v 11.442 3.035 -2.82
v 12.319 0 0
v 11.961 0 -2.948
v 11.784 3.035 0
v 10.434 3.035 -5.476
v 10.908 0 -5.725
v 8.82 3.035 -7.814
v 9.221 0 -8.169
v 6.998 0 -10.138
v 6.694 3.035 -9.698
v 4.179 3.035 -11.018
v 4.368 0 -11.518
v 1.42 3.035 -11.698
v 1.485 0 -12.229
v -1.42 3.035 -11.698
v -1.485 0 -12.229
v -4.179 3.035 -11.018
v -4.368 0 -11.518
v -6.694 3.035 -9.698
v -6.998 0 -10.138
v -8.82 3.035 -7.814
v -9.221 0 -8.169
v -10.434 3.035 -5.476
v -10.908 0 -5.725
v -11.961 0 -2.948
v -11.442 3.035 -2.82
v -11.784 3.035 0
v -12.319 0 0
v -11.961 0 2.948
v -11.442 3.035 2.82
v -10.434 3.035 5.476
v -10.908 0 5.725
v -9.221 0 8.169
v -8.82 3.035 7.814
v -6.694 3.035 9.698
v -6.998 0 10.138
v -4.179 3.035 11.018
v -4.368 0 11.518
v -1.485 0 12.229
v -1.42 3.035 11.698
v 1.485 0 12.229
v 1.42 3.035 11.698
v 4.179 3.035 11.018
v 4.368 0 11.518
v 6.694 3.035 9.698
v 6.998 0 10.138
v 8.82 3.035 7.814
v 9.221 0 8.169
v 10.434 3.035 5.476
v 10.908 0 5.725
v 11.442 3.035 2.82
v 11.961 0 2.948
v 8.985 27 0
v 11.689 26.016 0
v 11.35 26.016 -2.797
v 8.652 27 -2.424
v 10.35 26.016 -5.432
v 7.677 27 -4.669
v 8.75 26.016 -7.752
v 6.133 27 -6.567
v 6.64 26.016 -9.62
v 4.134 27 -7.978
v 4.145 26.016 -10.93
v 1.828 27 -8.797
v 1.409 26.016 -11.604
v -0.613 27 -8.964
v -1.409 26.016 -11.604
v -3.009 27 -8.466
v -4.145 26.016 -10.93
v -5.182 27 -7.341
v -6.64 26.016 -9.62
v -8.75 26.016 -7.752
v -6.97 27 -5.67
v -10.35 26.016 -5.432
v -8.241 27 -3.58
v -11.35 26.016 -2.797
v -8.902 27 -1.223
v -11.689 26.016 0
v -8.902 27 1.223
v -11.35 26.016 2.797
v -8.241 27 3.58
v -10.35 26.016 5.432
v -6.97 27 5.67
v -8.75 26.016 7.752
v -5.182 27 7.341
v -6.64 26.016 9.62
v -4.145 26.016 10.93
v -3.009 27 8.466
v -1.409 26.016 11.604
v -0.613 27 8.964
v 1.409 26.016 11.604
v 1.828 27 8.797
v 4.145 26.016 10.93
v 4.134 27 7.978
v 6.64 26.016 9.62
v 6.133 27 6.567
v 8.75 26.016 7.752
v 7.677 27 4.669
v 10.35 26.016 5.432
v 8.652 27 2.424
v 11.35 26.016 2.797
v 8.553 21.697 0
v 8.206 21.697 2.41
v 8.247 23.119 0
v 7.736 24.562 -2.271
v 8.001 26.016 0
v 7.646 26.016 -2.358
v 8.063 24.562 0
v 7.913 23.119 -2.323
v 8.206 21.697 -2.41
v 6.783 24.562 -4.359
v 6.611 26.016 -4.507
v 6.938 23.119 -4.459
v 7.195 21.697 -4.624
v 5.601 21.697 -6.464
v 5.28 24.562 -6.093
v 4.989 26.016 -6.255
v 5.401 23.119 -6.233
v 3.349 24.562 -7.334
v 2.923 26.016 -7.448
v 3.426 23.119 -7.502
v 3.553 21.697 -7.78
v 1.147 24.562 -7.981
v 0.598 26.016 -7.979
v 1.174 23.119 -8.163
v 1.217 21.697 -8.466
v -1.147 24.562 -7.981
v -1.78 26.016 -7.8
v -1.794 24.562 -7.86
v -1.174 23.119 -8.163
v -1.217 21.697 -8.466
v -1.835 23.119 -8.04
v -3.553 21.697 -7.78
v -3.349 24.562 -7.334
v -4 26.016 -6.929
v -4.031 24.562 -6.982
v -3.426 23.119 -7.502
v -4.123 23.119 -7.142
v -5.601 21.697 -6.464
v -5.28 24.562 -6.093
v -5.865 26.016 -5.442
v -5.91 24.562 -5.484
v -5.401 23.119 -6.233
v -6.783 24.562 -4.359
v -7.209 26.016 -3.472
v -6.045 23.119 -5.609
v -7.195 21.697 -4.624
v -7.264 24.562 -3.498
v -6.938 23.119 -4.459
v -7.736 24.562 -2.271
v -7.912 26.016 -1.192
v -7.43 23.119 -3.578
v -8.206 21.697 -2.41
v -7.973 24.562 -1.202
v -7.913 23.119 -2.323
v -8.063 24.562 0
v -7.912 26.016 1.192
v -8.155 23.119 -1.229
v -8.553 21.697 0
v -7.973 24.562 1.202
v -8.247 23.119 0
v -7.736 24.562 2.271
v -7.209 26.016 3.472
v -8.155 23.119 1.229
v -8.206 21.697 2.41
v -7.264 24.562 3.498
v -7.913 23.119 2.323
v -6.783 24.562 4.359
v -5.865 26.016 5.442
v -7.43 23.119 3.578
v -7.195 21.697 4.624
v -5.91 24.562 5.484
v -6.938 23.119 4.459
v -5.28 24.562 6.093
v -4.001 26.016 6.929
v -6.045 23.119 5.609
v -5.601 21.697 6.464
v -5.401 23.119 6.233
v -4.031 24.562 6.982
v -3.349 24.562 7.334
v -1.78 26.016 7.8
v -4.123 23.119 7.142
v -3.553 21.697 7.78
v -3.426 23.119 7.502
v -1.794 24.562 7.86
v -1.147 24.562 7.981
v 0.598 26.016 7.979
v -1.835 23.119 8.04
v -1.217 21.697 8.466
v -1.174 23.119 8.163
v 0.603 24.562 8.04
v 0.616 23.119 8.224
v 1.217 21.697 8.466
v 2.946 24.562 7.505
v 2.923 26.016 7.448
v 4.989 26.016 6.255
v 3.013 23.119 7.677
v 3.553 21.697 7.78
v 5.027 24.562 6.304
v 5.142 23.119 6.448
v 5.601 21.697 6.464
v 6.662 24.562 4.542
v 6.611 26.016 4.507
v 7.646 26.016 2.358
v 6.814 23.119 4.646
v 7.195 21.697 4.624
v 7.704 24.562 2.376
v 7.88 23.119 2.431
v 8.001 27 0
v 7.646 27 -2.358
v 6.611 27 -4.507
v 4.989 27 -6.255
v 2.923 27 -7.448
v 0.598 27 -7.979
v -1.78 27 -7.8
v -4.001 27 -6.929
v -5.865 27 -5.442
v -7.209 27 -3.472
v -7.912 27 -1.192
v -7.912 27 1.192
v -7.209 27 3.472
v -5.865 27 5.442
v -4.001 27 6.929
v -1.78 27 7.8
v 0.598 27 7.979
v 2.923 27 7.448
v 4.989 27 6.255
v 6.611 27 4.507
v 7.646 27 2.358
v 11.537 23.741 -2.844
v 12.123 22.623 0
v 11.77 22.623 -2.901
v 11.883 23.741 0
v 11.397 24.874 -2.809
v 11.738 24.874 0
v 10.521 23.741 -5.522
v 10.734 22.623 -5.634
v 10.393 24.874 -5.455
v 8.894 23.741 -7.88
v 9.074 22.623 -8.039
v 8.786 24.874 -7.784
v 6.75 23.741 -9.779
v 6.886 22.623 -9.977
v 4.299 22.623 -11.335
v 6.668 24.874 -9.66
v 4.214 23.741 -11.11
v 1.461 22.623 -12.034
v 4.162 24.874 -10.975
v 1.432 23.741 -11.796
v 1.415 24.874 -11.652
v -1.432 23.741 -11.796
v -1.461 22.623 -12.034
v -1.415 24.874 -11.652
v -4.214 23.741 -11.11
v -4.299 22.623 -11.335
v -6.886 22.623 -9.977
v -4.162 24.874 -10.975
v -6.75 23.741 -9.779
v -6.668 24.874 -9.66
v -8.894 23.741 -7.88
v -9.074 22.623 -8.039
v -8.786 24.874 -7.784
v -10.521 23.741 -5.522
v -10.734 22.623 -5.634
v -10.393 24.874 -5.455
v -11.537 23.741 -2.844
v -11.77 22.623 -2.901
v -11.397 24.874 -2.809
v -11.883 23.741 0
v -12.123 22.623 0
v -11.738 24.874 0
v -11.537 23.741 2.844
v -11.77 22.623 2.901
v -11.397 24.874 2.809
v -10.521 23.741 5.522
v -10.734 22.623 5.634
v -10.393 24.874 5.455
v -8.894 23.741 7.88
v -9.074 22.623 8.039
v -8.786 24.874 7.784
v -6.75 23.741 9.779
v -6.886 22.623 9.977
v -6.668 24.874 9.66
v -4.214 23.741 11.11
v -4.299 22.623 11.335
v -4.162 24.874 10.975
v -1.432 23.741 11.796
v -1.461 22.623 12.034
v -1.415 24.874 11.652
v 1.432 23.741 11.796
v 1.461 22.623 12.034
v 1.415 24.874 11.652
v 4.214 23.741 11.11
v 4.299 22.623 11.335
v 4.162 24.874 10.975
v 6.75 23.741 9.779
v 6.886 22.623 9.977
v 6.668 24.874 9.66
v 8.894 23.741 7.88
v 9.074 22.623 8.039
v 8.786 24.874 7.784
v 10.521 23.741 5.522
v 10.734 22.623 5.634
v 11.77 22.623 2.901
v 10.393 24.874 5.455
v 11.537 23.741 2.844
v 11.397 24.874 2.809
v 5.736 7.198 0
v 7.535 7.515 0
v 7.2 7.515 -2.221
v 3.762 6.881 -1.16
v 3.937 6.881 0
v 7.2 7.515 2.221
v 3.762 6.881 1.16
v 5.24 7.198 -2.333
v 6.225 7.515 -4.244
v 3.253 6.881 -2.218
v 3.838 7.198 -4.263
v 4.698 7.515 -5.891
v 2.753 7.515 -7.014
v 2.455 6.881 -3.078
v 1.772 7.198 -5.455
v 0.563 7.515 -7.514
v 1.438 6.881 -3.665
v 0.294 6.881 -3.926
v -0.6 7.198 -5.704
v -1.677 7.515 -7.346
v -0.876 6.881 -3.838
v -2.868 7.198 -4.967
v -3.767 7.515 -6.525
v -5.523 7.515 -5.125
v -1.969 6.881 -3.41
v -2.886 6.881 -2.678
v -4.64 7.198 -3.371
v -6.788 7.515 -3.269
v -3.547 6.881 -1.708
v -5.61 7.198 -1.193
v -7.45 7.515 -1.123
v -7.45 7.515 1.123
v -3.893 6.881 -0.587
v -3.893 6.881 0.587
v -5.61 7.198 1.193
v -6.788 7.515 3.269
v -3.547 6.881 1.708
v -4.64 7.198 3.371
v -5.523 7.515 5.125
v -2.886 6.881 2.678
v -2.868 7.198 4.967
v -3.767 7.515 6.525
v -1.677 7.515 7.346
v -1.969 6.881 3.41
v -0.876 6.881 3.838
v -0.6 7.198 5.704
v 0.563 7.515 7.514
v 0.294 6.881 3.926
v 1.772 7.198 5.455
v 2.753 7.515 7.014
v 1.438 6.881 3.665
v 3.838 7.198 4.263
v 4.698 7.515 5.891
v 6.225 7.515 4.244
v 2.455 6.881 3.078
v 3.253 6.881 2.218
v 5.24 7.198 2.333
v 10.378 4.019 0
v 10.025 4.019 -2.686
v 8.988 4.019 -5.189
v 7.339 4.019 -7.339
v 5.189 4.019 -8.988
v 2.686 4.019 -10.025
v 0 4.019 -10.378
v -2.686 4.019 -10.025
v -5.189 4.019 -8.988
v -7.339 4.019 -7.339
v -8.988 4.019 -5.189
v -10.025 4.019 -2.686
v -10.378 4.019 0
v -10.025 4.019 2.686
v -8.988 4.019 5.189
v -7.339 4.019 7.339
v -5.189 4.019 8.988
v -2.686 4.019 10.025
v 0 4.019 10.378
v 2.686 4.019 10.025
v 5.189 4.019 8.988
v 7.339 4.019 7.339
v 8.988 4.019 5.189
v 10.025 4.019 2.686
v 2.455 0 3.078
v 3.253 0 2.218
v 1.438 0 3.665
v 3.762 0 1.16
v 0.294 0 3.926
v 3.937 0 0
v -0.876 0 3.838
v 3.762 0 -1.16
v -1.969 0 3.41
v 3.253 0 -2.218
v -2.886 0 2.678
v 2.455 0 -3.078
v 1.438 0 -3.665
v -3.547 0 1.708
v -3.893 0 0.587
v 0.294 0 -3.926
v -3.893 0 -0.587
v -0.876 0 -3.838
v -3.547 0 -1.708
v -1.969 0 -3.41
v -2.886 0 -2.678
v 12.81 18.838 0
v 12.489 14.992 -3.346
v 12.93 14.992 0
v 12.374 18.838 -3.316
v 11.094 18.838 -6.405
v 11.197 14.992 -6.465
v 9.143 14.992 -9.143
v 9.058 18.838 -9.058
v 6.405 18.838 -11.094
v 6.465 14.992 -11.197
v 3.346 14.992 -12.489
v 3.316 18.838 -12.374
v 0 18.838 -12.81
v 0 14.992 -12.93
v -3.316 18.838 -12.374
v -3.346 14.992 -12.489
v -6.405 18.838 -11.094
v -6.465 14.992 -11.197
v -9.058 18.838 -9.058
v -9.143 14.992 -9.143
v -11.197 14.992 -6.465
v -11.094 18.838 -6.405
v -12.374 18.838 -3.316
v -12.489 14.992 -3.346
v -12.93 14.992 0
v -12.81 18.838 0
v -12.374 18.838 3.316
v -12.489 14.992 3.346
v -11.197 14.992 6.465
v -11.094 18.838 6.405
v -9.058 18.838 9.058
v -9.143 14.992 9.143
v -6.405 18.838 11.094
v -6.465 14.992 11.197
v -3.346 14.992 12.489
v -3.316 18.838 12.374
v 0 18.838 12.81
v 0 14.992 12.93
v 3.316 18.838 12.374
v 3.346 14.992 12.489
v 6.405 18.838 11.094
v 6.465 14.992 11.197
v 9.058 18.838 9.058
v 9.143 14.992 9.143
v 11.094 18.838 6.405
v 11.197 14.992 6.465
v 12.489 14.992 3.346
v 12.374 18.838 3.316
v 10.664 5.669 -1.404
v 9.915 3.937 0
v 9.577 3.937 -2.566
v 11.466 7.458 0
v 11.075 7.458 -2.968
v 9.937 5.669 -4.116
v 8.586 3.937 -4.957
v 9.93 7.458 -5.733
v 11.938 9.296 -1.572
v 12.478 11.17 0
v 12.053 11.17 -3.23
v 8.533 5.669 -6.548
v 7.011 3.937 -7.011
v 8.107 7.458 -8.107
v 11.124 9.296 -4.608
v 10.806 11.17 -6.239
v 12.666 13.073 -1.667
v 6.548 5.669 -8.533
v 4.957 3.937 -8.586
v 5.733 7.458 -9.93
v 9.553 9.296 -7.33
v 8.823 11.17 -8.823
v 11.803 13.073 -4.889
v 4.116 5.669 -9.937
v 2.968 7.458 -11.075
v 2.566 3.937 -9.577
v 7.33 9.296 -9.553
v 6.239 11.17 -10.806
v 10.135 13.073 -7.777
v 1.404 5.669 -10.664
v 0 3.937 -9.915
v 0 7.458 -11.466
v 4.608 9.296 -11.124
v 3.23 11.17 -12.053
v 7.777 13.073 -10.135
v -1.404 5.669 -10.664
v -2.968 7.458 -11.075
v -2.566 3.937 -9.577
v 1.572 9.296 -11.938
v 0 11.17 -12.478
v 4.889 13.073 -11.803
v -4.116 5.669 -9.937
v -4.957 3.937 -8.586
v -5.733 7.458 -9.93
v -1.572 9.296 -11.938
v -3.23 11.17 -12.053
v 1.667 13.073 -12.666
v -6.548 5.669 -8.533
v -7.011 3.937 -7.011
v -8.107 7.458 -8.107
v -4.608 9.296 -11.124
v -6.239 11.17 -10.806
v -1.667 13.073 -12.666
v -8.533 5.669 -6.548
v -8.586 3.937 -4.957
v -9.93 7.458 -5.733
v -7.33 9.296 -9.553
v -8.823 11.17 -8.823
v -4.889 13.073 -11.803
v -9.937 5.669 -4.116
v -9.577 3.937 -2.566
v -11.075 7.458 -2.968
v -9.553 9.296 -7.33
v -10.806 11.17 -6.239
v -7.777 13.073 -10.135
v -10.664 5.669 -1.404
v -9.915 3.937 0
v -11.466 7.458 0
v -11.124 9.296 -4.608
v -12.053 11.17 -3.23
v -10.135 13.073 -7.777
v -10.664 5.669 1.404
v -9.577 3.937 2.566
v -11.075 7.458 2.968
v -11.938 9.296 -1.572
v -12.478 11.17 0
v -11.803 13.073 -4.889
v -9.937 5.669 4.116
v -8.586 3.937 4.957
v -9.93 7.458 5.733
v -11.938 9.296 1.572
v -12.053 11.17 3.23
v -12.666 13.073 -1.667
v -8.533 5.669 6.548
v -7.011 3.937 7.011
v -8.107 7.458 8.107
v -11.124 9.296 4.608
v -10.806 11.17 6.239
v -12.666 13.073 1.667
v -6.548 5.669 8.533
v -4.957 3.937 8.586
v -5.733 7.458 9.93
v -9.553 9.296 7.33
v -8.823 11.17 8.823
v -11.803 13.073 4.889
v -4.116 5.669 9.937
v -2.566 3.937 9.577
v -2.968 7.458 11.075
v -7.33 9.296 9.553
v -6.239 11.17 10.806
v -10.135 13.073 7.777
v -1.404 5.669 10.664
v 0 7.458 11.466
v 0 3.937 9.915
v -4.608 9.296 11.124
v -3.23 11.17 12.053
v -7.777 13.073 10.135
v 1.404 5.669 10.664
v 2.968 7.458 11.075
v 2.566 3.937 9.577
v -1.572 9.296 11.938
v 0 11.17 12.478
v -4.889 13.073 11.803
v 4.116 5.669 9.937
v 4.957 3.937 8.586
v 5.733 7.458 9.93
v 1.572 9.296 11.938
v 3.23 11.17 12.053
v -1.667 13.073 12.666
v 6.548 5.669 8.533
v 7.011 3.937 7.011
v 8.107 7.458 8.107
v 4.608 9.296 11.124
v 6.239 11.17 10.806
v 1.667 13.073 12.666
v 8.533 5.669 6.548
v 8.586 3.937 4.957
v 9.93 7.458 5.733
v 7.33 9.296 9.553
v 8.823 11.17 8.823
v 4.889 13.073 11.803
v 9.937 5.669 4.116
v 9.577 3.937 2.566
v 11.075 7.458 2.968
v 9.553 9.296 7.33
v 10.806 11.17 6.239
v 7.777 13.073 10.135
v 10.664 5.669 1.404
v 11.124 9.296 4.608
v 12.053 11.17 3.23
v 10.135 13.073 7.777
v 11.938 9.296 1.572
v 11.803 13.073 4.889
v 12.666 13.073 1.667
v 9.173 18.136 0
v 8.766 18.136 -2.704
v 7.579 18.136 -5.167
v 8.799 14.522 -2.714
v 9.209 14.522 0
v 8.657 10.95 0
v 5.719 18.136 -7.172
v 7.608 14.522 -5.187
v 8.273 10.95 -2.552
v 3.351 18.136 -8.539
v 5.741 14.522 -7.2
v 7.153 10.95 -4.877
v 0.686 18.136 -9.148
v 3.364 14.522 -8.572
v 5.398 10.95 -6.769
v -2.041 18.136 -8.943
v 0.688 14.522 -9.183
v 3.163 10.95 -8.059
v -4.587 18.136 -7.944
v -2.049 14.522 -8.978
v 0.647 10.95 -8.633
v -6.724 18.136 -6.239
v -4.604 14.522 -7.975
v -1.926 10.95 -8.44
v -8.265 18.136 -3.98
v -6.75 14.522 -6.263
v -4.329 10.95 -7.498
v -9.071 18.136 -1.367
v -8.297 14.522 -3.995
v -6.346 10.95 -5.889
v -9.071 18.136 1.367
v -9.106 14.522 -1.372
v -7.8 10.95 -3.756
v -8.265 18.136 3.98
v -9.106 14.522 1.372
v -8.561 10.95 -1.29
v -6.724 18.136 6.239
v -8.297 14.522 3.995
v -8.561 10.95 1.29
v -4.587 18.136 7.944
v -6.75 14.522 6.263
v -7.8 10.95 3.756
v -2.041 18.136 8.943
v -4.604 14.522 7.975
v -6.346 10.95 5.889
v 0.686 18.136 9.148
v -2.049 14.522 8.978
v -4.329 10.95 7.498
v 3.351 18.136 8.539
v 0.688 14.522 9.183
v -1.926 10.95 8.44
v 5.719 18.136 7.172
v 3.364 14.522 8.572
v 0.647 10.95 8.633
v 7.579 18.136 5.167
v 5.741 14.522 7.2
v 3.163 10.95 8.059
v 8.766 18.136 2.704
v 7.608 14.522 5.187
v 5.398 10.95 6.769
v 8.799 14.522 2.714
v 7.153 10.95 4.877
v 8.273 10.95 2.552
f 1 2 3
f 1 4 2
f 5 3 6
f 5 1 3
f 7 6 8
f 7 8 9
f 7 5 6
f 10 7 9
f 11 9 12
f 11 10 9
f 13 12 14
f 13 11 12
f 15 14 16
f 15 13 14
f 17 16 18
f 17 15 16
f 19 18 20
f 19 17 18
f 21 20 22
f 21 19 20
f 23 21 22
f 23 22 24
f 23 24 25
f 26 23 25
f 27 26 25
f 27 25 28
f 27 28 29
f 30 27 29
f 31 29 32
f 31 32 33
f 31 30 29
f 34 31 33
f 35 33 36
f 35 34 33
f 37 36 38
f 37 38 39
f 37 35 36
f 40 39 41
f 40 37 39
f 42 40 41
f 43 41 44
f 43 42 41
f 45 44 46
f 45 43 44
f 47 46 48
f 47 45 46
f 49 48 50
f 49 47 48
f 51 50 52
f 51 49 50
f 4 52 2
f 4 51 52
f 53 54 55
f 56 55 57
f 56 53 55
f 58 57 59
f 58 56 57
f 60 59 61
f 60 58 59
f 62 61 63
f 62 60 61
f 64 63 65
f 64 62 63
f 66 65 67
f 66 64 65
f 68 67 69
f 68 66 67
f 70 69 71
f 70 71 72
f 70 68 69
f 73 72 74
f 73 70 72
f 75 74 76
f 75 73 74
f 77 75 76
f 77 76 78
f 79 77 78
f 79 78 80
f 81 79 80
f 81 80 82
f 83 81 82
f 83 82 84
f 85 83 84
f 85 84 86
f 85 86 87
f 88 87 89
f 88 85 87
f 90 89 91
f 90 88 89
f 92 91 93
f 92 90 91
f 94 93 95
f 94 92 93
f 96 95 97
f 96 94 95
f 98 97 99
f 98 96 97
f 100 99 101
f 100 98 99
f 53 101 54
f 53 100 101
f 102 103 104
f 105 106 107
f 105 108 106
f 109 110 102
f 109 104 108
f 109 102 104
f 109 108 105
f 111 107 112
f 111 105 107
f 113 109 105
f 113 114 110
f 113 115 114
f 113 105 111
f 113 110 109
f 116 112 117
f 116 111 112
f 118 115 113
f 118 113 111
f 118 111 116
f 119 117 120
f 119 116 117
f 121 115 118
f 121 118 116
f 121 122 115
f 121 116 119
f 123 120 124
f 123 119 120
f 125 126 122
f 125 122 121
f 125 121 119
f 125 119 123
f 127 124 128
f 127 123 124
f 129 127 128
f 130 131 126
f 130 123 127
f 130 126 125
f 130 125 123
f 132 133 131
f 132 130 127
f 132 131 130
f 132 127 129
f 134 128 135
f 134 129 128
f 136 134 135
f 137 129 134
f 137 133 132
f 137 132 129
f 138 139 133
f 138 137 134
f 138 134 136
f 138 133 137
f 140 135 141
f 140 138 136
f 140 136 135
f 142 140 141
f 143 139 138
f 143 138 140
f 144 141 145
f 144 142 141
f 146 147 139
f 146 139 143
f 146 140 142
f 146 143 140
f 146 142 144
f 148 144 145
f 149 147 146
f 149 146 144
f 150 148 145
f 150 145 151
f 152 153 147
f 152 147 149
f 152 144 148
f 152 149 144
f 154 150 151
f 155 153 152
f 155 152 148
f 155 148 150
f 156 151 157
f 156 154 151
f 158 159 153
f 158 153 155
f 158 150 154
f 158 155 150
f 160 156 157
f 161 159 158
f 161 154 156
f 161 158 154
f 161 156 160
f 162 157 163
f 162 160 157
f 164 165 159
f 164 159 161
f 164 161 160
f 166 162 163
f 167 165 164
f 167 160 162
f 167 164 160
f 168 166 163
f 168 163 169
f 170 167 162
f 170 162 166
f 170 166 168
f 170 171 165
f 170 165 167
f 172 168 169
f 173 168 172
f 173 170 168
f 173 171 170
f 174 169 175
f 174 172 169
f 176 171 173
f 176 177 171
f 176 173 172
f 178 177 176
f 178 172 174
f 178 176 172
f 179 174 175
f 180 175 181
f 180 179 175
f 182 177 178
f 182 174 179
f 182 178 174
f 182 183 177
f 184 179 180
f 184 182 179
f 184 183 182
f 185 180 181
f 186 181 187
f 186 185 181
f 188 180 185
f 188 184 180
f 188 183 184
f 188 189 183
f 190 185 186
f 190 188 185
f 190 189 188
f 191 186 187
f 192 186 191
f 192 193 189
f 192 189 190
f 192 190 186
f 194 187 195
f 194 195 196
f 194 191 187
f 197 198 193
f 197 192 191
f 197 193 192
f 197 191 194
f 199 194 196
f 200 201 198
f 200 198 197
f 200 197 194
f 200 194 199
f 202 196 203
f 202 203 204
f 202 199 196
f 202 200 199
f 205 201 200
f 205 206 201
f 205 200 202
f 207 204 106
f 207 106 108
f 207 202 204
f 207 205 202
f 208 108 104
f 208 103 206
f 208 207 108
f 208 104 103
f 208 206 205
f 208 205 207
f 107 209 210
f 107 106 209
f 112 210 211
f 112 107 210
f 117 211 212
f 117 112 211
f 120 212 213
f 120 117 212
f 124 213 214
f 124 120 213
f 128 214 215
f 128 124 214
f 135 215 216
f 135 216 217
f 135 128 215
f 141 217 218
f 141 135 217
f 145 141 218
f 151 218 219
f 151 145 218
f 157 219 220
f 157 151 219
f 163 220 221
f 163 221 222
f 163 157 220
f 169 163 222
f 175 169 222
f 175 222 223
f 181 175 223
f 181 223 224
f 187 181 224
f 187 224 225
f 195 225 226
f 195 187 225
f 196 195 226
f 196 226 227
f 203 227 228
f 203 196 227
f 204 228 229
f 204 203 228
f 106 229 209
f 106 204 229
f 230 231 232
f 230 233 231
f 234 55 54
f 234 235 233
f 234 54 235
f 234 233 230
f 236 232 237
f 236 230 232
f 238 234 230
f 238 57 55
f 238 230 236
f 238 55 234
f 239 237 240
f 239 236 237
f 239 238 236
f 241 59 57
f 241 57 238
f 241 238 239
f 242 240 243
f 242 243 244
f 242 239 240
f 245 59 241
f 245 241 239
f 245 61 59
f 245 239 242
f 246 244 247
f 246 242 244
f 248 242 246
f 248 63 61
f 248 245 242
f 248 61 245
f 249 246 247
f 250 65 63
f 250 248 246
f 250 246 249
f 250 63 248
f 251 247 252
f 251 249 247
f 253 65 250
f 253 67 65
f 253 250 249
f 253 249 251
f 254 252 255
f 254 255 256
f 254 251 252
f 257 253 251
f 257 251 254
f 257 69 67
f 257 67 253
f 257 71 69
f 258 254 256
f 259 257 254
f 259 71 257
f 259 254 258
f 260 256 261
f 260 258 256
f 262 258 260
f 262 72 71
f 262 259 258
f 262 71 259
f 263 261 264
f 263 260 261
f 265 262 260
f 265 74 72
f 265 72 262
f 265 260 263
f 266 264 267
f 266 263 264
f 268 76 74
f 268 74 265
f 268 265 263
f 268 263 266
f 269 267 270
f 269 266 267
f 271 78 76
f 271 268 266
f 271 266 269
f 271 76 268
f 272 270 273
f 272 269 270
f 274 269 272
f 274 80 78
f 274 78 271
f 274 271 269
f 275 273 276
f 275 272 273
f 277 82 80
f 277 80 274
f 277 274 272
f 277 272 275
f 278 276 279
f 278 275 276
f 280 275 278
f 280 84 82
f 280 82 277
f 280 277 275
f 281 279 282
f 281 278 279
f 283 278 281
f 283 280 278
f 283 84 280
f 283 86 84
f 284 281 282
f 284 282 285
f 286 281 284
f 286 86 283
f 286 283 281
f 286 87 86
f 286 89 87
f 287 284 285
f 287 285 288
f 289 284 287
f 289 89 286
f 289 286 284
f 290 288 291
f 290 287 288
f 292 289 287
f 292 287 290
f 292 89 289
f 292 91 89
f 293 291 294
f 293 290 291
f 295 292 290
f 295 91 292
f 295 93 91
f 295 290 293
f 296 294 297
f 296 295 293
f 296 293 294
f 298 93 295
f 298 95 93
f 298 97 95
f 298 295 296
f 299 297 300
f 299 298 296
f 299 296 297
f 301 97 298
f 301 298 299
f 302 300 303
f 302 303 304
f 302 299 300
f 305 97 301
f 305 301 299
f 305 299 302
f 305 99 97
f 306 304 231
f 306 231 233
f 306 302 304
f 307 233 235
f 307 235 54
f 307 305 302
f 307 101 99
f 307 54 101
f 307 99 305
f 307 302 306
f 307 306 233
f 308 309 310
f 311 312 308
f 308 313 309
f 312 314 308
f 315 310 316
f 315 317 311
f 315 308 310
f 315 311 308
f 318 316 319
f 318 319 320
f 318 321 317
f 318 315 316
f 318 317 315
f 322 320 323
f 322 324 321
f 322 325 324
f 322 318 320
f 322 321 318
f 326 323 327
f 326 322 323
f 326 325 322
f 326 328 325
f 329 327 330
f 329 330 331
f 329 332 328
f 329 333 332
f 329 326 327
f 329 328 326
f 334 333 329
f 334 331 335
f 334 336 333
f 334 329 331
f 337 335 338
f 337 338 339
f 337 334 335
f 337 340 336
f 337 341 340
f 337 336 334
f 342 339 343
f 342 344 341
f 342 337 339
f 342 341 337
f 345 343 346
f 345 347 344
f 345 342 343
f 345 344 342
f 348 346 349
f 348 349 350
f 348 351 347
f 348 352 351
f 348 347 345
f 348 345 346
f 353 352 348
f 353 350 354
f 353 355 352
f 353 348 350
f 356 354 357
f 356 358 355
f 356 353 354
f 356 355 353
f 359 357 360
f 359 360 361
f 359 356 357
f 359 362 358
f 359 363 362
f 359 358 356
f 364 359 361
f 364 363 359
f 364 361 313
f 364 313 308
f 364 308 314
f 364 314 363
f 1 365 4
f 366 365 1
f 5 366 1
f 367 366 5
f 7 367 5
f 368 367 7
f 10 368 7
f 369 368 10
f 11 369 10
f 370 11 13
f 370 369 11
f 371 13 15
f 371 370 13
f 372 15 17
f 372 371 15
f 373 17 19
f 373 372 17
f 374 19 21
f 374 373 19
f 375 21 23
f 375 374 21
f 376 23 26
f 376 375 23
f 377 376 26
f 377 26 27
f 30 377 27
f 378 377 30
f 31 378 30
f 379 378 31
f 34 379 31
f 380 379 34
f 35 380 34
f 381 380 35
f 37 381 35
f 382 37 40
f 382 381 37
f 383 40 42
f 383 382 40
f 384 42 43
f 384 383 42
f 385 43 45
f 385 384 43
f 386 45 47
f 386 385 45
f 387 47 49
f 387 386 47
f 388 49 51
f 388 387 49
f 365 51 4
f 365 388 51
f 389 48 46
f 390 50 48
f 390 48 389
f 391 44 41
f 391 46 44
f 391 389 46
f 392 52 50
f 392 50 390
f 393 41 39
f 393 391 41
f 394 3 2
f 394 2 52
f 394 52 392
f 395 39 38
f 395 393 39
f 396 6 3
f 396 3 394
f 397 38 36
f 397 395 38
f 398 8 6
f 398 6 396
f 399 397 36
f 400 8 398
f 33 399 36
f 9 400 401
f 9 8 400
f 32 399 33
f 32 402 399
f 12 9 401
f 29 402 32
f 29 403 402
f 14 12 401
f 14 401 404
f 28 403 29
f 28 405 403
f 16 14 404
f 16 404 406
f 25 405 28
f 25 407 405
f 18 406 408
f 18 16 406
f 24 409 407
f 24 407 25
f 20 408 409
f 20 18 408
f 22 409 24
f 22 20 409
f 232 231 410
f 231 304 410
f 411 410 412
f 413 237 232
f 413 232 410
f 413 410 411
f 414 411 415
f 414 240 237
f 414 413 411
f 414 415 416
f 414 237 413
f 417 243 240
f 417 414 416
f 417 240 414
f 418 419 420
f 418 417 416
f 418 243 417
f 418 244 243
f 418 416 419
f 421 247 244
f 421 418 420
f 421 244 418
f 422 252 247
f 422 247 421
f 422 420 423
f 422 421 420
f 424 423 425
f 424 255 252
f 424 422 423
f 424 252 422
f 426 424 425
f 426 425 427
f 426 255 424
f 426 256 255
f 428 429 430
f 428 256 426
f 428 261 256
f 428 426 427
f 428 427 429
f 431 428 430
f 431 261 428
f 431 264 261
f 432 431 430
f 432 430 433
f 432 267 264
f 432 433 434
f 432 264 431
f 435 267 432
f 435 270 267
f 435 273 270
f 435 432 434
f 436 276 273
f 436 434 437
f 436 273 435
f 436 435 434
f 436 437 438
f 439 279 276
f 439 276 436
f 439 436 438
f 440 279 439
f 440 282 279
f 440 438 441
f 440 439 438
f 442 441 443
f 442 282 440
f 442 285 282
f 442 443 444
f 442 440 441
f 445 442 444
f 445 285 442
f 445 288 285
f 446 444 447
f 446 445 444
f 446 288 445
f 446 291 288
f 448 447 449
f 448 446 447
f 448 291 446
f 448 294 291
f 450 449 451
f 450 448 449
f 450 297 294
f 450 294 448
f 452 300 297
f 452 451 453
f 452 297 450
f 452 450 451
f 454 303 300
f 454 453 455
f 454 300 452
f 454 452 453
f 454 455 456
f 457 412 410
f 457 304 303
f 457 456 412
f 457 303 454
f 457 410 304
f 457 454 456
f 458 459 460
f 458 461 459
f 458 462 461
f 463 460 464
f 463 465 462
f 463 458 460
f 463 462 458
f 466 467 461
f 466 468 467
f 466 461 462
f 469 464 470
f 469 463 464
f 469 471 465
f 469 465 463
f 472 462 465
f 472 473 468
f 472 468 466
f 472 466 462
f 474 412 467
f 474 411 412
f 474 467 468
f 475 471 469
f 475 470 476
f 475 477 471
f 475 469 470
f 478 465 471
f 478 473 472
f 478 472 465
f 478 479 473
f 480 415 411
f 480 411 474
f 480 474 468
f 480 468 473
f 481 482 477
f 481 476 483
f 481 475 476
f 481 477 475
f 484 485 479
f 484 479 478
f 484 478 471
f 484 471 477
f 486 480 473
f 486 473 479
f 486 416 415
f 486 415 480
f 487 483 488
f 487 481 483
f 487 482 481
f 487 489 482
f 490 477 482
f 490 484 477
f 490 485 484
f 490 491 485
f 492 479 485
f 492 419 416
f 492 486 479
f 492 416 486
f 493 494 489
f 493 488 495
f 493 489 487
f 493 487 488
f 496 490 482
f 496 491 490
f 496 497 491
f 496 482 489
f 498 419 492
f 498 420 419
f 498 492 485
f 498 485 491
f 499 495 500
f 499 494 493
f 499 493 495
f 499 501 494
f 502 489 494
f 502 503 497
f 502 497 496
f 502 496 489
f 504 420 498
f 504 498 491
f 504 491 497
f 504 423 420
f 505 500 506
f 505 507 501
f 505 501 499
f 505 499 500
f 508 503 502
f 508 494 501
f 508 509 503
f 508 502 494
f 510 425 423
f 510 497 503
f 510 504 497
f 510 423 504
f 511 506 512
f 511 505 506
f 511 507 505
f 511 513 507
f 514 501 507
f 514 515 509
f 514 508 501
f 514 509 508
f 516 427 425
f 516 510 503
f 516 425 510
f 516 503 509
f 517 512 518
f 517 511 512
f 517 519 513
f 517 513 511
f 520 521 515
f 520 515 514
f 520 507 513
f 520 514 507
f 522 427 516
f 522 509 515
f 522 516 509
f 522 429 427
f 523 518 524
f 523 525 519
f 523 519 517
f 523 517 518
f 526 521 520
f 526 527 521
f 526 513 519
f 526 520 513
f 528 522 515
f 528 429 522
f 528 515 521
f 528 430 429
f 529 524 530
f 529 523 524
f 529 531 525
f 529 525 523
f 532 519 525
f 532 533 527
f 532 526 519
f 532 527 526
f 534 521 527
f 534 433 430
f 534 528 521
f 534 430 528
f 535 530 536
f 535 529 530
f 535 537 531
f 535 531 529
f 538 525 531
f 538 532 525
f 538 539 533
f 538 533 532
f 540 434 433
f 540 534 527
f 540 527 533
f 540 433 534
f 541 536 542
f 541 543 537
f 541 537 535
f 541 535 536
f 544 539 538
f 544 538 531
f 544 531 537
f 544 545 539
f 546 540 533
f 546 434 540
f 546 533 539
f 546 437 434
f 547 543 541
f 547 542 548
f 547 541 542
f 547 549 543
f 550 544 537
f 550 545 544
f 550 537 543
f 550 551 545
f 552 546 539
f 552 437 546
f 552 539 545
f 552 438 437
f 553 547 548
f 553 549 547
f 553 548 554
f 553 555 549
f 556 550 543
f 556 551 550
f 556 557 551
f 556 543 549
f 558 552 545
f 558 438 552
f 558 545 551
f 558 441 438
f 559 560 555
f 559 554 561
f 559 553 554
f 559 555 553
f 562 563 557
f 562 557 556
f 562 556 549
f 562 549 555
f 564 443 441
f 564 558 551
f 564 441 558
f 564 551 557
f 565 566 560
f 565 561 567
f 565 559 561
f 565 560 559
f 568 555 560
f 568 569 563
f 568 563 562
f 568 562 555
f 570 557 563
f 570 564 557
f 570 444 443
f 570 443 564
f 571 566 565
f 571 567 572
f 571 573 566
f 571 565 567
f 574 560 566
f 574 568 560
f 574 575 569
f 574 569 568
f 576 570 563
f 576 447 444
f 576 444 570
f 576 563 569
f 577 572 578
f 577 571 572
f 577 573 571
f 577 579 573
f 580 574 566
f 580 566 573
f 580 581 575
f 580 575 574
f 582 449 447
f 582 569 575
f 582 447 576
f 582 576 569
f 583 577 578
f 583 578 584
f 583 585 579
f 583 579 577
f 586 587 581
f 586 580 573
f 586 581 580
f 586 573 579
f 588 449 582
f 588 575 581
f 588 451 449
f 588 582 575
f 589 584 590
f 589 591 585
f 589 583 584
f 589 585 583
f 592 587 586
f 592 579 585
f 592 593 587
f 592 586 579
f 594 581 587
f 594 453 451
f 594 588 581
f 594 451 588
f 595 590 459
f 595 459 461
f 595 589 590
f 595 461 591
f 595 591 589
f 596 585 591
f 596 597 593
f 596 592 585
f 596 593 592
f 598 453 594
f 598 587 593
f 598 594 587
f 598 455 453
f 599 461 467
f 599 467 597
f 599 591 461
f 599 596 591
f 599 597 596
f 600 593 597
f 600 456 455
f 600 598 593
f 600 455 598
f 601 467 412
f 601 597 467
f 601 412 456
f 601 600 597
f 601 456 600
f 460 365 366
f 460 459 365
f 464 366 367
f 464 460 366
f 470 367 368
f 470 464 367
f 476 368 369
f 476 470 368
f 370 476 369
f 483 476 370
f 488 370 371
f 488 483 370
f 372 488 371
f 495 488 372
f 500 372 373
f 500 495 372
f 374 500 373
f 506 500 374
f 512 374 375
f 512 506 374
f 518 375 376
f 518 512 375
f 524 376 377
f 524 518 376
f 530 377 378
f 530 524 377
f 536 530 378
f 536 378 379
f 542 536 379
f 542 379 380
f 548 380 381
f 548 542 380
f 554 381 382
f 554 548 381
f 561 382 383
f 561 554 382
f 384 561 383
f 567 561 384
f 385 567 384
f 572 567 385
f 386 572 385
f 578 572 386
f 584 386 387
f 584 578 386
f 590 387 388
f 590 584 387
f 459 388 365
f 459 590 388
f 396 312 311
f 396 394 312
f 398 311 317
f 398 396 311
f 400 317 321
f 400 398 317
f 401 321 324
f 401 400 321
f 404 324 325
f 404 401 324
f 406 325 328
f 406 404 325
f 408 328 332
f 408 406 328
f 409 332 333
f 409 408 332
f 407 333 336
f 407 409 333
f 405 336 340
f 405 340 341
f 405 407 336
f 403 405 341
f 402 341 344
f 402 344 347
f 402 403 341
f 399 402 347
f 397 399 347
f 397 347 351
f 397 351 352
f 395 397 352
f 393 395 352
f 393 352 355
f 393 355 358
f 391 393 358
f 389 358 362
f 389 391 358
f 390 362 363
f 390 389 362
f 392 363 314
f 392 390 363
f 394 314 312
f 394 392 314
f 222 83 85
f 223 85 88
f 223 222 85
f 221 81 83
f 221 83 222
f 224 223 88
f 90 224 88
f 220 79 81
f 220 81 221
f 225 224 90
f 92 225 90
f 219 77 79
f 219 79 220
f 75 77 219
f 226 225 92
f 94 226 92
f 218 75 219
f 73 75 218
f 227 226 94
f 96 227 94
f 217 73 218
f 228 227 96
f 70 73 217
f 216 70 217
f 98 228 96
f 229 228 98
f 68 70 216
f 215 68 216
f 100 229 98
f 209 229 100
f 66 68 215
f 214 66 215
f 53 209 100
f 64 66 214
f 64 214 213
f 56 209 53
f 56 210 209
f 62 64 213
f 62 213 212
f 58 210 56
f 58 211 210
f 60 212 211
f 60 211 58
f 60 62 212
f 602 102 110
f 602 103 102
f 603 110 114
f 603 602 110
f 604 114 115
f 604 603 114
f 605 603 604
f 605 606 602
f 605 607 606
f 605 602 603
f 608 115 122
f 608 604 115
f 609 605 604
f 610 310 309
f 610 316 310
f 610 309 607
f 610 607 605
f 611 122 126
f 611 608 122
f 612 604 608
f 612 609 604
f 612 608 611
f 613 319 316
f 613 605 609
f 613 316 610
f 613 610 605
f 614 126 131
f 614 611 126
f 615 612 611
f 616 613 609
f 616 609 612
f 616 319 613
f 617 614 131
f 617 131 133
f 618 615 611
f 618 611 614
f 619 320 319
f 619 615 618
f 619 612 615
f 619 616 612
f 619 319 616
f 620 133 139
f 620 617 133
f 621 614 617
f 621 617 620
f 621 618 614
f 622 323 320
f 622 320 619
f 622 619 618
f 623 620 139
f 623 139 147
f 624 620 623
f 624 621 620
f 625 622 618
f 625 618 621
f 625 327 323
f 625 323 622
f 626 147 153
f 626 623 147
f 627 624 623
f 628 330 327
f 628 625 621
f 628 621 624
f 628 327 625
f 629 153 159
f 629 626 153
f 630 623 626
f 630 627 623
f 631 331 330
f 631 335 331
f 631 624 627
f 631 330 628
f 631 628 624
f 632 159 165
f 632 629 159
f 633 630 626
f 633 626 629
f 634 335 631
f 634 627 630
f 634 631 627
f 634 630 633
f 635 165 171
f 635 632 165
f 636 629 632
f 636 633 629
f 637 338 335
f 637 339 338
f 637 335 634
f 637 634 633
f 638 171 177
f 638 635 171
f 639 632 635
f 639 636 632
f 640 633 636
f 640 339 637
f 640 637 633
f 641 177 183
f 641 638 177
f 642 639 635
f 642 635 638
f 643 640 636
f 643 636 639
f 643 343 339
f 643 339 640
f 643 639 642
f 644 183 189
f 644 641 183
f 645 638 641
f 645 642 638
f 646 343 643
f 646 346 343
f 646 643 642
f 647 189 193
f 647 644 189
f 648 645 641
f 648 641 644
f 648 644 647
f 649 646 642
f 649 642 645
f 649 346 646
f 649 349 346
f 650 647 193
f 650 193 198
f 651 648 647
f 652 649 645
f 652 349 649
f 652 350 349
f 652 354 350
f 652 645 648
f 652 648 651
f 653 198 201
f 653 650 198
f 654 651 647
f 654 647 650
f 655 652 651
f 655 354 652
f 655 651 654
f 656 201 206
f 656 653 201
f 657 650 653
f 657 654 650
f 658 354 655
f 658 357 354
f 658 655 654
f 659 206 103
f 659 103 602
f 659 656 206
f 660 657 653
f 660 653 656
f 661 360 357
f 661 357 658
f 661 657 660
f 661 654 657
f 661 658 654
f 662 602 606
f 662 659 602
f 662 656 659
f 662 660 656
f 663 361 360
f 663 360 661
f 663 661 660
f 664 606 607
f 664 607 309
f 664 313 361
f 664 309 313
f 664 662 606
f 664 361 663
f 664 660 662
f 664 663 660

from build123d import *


with BuildPart() as part:
    # Sketch1 → Revolve1 (revolve)
    with BuildSketch(Plane.XY, mode=Mode.PRIVATE) as revolve1_sk:
        with BuildLine():
            Line((-3.937, 6.880739389), (-3.937, 0))
            Line((-3.937, 0), (-12.319, 0))
            Line((-12.319, 0), (-11.783931251, 3.034525669))
            Line((-11.783931251, 3.034525669), (-10.378276575, 4.018775669))
            Line((-10.378276575, 4.018775669), (-9.914503712, 3.937))
            ThreePointArc((-9.914503712, 3.937), (-12.774986685, 13.072695411), (-12.122652106, 22.623493969))
            ThreePointArc((-12.122652106, 22.623493969), (-11.798191929, 24.305948687), (-11.68945465, 26.01595))
            Line((-11.68945465, 26.01595), (-8.98525, 27.0002))
            Line((-8.98525, 27.0002), (-8.001, 27.0002))
            Line((-8.001, 27.0002), (-8.001, 26.01595))
            ThreePointArc((-8.001, 26.01595), (-8.139446135, 23.838747534), (-8.552554296, 21.696617855))
            ThreePointArc((-8.552554296, 21.696617855), (-9.208525617, 14.522239239), (-7.534619557, 7.515096784))
            Line((-7.534619557, 7.515096784), (-3.937, 6.880739389))
        make_face()
    revolve(revolve1_sk.sketch.rotate(Axis((0, 0, 0), (0, 1, 0)), 180), axis=Axis((0, 0, 0), (0, 1, 0)))


solid = part.part
